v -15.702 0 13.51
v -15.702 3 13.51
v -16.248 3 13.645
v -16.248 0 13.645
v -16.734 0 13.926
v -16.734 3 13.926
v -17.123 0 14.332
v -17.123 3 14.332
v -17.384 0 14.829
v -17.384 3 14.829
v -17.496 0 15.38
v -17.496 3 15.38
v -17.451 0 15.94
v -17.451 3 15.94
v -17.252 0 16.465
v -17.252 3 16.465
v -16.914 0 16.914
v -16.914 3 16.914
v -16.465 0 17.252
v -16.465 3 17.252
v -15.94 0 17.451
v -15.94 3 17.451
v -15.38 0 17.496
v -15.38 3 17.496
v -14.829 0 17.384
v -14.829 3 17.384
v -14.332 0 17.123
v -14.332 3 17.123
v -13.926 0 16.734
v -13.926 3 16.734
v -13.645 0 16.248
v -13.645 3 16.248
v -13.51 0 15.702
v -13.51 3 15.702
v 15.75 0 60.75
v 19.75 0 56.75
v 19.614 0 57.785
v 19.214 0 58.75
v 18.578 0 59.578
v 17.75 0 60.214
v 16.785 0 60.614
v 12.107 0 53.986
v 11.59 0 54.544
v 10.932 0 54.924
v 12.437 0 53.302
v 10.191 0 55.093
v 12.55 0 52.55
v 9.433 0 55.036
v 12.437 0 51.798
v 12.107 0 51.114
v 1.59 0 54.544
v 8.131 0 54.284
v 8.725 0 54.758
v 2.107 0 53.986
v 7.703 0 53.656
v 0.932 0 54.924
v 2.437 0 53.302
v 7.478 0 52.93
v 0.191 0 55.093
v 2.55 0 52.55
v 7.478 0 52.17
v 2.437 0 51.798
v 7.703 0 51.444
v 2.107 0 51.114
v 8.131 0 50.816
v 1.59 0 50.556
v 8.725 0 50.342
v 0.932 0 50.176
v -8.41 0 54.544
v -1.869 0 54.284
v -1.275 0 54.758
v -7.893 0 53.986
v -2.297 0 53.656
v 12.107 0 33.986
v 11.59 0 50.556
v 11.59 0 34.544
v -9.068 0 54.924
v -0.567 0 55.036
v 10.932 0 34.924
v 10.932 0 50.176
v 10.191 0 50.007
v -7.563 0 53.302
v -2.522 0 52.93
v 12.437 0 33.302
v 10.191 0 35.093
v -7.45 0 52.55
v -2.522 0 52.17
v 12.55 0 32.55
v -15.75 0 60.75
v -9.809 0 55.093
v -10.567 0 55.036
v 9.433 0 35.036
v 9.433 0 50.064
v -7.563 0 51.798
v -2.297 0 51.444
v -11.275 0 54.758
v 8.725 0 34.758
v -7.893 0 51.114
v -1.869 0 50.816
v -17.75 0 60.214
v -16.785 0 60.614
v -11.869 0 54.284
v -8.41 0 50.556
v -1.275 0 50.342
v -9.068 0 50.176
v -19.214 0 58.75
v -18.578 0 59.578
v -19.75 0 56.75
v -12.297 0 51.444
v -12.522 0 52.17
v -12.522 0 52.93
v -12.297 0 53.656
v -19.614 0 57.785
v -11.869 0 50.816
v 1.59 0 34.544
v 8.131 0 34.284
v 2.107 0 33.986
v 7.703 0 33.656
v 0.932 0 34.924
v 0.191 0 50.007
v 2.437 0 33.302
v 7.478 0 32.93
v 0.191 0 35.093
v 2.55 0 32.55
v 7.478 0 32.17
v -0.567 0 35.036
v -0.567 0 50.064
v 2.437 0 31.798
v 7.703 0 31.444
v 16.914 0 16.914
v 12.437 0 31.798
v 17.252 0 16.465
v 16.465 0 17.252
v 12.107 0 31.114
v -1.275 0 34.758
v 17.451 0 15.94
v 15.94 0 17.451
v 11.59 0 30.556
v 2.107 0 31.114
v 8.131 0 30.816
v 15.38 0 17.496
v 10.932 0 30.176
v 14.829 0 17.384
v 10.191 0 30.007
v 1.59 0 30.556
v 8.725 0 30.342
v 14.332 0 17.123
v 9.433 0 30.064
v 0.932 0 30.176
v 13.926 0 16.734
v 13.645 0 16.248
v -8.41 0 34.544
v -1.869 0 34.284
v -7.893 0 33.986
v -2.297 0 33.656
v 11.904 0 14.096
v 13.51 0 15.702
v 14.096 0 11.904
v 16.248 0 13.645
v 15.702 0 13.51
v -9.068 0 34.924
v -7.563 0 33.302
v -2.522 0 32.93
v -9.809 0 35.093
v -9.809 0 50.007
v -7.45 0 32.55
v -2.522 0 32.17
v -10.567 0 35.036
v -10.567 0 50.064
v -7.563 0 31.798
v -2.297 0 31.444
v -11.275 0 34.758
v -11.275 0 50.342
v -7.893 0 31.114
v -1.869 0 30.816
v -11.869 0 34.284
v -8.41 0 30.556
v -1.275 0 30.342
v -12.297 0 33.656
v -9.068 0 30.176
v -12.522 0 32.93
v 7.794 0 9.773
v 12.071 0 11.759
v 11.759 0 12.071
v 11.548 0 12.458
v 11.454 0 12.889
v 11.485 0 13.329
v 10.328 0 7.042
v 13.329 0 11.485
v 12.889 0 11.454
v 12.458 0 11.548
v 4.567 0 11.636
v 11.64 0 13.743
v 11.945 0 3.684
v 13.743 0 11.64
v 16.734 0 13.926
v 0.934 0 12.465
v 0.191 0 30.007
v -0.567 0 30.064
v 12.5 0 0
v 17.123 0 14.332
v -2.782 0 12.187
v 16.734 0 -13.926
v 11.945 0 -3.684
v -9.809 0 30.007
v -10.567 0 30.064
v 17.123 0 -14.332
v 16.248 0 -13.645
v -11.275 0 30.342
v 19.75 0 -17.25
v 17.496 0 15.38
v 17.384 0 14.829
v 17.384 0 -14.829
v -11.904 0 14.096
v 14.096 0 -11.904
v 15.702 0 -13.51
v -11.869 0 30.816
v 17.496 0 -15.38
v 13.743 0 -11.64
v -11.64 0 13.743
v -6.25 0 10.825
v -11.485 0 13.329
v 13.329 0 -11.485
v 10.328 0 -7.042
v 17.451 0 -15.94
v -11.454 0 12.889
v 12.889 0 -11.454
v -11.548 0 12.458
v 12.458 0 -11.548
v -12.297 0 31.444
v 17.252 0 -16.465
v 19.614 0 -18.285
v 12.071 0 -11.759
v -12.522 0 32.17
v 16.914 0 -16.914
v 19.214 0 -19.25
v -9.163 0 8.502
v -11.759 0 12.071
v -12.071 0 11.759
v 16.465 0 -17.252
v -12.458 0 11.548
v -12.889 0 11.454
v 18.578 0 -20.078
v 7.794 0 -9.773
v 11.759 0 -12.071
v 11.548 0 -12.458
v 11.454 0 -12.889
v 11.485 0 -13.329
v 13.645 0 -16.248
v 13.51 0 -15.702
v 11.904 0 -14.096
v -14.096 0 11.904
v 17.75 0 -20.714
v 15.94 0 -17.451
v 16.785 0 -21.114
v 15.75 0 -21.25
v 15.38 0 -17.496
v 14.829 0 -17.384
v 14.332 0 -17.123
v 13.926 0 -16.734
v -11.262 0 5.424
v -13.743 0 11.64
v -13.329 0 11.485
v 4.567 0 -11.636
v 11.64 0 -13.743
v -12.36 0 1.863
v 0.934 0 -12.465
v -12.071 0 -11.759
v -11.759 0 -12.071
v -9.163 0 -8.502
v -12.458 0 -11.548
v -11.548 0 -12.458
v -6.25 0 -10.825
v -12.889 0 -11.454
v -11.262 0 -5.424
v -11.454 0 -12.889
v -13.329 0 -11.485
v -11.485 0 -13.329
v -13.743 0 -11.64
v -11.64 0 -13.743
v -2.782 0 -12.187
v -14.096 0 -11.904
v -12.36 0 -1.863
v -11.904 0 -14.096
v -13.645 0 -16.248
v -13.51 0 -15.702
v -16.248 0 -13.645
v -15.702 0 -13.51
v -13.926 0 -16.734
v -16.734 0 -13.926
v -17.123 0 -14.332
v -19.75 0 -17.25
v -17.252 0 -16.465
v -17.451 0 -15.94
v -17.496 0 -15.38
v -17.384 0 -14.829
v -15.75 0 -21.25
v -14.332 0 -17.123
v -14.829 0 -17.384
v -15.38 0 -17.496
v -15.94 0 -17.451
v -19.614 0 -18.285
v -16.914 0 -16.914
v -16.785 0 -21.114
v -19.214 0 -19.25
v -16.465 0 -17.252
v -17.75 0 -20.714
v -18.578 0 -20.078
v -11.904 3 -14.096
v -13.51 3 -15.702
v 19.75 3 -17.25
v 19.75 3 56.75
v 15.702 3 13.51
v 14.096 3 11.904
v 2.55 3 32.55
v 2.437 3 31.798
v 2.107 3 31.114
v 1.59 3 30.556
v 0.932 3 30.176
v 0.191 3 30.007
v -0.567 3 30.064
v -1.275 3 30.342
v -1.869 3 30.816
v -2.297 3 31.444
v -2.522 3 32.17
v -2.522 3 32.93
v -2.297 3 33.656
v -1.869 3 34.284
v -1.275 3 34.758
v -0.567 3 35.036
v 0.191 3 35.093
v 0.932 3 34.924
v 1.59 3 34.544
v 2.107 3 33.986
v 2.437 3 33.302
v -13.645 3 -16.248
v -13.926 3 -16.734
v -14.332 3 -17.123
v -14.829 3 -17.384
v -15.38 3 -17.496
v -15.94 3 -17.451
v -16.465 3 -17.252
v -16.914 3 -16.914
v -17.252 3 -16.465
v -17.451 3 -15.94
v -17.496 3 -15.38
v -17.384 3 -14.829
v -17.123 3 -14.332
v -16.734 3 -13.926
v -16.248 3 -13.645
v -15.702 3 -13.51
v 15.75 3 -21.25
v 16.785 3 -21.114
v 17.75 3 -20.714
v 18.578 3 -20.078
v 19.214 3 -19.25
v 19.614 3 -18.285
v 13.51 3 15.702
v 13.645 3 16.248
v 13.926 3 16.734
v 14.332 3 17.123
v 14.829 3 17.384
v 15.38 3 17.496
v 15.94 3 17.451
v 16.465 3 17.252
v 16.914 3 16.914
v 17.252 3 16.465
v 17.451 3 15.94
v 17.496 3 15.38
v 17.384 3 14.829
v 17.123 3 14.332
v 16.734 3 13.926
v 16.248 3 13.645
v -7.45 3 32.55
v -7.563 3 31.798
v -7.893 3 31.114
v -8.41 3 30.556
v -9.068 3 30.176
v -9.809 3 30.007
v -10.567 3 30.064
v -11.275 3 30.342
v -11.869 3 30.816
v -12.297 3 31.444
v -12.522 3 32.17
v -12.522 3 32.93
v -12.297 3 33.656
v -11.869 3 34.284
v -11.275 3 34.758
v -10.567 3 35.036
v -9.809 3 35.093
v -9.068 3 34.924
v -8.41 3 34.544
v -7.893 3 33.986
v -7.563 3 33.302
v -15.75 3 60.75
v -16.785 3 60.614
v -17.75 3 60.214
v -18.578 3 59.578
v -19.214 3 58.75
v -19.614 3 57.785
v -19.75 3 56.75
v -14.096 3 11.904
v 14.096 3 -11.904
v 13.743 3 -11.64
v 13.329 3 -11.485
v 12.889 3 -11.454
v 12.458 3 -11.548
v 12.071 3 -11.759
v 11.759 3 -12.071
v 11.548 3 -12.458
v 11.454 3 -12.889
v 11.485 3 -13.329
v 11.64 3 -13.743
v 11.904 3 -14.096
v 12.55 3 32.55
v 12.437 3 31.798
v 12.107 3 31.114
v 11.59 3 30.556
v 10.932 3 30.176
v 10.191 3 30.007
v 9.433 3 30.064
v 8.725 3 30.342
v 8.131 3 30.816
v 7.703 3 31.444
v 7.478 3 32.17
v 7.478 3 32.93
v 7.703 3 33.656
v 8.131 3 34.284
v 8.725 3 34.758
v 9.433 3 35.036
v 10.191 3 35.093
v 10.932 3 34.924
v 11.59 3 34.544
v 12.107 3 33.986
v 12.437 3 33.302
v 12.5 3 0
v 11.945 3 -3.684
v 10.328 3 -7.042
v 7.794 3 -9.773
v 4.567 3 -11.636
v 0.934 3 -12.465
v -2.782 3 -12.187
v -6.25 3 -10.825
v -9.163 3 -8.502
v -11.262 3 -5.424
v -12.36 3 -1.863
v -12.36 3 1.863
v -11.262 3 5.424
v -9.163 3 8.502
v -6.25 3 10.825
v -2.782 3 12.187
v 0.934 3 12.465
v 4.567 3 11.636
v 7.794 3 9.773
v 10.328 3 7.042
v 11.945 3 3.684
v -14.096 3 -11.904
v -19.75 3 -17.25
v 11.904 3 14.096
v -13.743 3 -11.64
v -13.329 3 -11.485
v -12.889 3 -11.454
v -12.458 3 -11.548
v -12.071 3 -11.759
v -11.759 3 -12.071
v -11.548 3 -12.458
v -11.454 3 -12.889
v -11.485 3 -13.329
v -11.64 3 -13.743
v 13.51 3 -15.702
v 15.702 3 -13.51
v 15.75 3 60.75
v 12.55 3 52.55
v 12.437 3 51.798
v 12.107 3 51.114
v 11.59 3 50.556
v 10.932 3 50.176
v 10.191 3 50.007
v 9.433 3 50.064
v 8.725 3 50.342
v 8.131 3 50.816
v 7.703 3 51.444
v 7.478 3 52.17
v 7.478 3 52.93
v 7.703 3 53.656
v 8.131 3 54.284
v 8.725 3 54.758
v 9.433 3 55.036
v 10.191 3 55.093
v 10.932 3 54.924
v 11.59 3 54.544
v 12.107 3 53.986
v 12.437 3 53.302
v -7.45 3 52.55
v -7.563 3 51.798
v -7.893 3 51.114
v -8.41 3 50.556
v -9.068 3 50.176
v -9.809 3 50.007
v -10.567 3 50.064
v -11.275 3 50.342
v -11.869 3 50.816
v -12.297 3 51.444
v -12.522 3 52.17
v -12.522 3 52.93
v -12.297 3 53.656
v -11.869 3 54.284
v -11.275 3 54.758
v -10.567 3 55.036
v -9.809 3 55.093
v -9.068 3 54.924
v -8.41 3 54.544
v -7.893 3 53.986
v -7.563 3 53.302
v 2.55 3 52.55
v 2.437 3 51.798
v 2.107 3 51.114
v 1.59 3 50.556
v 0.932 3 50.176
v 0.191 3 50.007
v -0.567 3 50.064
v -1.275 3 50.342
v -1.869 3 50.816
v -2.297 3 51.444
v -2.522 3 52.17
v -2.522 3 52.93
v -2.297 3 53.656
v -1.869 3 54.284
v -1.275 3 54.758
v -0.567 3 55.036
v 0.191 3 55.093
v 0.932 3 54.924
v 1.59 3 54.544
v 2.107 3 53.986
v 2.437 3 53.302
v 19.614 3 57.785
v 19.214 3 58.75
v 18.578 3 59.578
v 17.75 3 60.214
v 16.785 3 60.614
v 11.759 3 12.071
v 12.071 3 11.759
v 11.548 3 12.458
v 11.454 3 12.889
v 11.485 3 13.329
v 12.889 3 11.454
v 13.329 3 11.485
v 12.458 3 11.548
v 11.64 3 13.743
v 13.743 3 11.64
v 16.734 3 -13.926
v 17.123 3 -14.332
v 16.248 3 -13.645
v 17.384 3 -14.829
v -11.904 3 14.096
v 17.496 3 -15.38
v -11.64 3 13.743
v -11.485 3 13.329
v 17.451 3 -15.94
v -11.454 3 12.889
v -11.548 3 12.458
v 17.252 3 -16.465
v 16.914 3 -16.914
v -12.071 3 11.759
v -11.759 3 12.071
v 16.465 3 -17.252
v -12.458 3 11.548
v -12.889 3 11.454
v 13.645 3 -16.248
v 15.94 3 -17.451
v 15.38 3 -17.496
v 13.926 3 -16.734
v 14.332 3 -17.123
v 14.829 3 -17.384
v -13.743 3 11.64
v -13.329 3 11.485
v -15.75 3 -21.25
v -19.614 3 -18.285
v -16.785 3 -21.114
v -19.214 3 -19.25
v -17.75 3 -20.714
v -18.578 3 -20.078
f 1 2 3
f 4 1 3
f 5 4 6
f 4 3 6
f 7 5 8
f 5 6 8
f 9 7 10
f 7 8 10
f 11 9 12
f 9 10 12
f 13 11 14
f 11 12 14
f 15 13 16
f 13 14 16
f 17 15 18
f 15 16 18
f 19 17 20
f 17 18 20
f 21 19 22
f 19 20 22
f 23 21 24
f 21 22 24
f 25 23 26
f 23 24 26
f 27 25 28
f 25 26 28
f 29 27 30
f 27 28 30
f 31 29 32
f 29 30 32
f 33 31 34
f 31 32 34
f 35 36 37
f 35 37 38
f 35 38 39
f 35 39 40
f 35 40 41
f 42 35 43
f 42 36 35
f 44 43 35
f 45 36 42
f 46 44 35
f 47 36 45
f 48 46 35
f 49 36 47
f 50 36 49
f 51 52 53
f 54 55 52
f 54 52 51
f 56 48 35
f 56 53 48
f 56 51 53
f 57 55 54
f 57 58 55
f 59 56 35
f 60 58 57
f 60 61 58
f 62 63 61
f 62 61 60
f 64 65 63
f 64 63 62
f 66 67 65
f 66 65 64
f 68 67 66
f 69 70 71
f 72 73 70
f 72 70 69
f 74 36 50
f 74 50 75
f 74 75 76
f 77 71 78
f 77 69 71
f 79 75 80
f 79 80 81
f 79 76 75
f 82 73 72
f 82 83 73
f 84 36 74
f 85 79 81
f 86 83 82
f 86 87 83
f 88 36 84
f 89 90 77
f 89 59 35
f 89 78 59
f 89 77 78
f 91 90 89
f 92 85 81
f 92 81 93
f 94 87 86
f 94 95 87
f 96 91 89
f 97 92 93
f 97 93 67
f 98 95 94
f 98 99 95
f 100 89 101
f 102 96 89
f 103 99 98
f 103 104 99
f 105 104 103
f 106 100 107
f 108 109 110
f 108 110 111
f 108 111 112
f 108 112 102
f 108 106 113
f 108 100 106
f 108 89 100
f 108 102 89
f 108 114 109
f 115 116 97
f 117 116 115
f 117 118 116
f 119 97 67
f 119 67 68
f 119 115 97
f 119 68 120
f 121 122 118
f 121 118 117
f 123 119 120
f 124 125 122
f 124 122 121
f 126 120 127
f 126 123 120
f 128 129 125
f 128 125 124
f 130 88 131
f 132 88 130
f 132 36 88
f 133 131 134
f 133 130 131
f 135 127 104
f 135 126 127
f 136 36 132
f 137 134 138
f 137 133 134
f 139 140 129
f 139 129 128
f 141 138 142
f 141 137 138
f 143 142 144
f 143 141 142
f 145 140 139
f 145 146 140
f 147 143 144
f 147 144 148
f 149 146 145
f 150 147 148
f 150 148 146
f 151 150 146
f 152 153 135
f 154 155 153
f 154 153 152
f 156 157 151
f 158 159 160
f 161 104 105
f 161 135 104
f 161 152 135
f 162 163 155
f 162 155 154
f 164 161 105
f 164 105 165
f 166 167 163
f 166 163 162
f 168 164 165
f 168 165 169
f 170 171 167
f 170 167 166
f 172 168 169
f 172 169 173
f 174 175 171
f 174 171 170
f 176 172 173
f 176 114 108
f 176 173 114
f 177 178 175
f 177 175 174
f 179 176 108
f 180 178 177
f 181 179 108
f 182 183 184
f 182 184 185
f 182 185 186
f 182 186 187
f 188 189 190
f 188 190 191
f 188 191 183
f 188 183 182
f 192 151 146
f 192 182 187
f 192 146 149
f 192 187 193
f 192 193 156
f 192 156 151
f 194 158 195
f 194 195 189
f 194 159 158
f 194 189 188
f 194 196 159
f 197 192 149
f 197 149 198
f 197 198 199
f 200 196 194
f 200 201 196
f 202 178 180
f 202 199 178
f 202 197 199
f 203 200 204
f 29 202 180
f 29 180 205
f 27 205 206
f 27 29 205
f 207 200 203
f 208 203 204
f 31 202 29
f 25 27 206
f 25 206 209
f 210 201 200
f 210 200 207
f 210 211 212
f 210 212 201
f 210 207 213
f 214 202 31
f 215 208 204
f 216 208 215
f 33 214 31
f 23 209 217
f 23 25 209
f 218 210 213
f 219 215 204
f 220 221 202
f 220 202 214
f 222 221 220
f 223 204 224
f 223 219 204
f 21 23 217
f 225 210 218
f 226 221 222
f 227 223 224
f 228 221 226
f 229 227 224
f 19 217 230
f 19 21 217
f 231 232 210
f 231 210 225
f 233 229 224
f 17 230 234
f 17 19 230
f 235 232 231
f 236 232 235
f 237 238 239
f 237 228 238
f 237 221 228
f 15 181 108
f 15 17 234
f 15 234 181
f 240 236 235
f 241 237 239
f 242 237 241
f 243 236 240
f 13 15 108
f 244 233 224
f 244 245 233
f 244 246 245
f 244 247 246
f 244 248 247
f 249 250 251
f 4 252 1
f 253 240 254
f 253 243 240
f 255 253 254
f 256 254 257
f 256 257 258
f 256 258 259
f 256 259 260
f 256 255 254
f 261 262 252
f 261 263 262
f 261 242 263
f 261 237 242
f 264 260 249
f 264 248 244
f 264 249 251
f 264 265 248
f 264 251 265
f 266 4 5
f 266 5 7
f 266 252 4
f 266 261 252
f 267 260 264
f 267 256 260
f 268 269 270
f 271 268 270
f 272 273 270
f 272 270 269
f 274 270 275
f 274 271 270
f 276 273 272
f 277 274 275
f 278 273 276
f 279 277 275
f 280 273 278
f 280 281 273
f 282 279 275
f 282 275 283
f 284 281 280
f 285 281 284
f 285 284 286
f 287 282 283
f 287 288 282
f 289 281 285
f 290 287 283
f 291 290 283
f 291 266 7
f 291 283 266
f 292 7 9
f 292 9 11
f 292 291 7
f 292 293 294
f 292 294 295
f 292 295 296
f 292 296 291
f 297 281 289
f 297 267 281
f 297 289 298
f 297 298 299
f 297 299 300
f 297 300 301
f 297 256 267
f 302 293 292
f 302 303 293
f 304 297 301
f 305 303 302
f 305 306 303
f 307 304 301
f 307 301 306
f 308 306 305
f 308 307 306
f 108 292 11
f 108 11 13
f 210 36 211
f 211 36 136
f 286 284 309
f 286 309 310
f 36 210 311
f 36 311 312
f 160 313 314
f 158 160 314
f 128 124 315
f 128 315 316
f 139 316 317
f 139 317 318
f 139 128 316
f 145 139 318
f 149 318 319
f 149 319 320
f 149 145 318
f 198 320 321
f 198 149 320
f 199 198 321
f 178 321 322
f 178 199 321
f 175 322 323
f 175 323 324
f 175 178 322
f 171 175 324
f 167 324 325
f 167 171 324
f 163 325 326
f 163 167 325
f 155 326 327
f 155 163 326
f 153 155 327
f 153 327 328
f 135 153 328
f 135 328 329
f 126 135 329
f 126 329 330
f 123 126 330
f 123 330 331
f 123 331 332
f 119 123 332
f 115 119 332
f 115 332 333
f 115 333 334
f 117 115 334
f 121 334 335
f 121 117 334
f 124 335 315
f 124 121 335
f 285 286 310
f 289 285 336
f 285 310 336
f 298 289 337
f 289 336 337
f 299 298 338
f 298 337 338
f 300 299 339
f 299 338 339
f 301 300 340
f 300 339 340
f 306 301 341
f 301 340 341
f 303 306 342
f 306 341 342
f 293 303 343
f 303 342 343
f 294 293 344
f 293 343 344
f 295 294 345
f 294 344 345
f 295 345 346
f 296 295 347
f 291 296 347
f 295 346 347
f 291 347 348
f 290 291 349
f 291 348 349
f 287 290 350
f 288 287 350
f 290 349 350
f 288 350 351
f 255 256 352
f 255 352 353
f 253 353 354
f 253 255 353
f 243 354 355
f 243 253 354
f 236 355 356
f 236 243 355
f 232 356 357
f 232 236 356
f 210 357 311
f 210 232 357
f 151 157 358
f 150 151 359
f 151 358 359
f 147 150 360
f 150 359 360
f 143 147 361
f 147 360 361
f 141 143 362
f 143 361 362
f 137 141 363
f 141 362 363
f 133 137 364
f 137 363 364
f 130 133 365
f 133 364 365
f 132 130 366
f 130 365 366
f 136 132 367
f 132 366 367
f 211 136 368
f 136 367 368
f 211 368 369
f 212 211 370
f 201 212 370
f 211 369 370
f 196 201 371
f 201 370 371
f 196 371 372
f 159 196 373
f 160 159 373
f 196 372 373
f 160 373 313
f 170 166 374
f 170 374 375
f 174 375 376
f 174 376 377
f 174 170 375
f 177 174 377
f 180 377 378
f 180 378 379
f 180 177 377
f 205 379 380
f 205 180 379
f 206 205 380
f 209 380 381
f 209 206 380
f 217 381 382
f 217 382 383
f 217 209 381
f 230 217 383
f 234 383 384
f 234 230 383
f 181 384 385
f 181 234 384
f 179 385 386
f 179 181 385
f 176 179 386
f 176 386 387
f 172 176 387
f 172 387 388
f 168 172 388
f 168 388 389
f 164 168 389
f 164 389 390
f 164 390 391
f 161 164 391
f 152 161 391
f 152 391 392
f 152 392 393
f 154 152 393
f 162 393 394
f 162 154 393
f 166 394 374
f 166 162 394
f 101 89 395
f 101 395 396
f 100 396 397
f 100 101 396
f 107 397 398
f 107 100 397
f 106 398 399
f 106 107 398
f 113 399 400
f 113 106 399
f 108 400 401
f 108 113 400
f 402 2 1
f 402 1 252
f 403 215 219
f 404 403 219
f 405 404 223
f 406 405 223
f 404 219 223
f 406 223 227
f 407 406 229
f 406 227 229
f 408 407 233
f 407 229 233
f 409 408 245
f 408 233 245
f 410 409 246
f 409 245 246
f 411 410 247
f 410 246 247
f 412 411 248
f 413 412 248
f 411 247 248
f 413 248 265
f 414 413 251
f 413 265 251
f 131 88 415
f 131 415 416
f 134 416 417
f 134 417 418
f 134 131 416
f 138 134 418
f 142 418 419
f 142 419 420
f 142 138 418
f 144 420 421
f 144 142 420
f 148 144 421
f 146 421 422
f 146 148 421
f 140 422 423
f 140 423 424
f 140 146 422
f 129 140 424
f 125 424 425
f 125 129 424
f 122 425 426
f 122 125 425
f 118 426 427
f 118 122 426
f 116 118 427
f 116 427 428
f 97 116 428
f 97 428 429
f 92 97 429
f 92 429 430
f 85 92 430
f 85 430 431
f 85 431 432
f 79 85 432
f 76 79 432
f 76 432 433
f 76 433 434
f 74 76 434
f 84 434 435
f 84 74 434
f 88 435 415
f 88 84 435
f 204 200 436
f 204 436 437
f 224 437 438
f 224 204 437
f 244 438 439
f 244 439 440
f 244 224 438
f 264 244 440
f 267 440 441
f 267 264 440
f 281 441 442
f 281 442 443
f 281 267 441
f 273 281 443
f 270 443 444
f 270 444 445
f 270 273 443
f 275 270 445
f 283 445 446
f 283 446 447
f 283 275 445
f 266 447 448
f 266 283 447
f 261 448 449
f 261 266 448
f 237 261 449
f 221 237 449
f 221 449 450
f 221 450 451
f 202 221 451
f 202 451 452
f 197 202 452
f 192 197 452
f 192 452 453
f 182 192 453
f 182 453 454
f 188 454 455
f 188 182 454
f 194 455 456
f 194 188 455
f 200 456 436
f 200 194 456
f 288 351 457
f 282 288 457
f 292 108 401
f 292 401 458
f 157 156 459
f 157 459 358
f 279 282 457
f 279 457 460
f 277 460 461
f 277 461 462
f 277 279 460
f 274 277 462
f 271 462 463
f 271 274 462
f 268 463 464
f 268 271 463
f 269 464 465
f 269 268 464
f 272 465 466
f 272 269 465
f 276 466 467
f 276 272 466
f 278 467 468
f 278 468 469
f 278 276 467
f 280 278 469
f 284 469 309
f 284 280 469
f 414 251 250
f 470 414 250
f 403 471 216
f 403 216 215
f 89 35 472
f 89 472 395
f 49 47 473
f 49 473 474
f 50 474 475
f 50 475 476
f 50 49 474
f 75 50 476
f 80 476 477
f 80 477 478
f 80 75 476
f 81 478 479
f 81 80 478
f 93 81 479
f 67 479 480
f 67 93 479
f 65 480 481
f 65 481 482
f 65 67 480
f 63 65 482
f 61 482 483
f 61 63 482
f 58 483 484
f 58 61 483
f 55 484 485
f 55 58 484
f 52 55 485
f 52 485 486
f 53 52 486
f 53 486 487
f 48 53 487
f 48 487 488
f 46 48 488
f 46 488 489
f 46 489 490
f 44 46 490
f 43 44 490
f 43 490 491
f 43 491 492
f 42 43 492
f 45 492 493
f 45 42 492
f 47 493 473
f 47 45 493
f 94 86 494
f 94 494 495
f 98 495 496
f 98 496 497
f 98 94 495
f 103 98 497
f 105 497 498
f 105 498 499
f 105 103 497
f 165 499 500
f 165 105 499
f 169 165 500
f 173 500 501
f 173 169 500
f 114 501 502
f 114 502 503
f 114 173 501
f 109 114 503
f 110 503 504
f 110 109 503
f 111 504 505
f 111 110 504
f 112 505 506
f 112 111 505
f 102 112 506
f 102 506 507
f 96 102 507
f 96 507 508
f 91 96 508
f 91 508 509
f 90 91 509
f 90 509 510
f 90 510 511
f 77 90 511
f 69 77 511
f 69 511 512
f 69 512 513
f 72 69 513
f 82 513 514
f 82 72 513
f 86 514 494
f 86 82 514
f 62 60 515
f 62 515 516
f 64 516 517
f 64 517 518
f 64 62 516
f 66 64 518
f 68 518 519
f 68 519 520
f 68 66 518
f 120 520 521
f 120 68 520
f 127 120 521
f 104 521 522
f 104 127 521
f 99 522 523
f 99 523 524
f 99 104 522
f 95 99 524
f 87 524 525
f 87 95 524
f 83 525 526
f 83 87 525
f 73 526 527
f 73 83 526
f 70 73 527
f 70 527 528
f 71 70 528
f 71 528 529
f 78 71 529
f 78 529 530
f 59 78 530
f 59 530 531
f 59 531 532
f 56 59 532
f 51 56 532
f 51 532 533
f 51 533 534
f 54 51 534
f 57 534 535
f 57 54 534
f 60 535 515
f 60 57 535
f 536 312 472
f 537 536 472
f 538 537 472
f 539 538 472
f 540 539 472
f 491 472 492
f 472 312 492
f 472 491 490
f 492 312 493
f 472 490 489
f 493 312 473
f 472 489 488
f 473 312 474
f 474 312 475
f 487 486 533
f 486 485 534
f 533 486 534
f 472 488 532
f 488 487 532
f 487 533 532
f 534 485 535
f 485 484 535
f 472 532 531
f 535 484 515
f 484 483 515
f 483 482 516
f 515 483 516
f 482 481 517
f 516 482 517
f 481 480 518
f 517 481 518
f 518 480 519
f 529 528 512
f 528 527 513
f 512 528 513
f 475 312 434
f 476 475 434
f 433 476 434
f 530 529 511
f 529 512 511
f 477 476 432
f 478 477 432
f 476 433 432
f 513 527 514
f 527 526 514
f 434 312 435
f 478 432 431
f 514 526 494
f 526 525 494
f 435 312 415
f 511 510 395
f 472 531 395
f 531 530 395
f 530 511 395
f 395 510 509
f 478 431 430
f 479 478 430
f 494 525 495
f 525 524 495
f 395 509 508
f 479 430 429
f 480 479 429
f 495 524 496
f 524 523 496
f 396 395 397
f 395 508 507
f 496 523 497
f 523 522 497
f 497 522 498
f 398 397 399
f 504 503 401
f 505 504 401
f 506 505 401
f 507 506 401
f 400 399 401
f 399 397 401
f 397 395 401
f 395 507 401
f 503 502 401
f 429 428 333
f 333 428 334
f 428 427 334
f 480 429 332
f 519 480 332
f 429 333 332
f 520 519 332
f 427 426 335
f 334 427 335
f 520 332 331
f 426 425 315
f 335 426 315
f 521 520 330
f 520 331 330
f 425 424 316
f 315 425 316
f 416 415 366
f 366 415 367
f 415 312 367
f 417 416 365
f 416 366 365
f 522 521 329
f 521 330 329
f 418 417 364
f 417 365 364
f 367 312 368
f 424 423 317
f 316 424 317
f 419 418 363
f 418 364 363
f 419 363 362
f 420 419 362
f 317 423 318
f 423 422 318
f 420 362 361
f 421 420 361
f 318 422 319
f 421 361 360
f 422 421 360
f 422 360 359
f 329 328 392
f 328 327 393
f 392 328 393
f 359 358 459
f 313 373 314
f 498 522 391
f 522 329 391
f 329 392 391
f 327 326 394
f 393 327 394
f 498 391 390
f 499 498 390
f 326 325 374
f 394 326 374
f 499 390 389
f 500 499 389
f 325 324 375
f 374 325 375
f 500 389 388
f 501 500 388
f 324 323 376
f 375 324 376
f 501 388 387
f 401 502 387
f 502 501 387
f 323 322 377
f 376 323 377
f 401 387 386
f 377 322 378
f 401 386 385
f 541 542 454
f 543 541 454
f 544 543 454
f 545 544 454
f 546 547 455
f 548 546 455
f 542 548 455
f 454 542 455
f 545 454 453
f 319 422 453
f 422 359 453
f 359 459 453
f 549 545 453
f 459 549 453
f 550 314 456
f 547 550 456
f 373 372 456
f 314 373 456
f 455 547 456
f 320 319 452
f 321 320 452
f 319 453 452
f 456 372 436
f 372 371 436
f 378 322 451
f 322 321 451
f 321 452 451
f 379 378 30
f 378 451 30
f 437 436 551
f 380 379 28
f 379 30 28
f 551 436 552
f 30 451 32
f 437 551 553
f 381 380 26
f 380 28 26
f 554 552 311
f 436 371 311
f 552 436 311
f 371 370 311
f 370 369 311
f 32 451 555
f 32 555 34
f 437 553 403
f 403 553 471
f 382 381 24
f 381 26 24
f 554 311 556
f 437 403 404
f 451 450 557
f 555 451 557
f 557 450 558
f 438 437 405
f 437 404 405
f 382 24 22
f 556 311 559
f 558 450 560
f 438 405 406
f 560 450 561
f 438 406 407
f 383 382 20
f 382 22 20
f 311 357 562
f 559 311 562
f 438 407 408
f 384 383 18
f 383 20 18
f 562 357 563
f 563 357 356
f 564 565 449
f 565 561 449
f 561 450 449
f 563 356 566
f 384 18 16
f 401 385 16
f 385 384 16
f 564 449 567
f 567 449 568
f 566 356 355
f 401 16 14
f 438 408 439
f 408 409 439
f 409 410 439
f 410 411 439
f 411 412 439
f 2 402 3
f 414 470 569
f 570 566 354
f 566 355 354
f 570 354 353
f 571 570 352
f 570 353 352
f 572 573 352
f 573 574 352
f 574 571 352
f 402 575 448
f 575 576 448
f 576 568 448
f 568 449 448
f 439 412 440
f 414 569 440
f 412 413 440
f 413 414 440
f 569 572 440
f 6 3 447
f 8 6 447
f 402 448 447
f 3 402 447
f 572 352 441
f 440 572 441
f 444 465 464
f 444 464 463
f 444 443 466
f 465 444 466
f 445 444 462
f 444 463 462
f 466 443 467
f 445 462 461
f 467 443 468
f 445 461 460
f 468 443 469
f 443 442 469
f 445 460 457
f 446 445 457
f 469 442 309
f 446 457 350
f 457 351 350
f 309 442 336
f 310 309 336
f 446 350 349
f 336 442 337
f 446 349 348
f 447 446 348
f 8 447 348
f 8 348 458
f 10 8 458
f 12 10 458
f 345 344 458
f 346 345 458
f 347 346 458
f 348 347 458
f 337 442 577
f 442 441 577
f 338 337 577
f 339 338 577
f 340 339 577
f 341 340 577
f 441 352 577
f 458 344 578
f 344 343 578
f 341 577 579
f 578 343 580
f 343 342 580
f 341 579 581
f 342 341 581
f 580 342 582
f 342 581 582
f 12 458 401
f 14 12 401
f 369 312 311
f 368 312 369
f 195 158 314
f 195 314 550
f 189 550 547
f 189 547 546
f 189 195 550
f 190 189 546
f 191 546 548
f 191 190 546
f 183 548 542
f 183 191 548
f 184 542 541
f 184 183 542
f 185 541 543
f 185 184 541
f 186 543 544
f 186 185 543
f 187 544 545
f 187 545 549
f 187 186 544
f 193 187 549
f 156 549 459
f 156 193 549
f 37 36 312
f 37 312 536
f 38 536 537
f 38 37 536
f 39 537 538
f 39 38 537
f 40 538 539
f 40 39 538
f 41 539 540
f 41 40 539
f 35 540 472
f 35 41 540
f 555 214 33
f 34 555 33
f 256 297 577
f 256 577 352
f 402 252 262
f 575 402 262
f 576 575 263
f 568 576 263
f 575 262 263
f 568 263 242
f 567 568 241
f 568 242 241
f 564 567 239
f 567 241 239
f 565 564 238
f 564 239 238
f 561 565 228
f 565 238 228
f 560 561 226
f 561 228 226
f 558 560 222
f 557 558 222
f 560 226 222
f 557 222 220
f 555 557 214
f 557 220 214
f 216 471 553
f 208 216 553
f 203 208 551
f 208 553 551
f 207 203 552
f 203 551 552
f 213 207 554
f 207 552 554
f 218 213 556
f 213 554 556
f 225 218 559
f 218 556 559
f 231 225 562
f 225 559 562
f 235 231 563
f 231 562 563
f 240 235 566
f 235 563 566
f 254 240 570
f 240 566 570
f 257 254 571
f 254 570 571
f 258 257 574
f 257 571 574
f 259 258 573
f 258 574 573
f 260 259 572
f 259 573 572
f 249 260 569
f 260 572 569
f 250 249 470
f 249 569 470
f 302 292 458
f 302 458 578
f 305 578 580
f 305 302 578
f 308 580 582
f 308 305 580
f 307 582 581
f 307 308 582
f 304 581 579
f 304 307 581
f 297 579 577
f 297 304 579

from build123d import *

# Parameters (mm, degrees)
SKETCH1_R           = 12.5
SKETCH1_R_2         = 2.55
BOSS_EXTRUDE1_DEPTH = 3
SKETCH2_R           = 2
CUT_EXTRUDE1_DEPTH  = 10


with BuildPart() as part:
    # Sketch1 → Boss-Extrude1 (new body)
    with BuildSketch(Plane(origin=(0, 0, 0), x_dir=(1, 0, 0), z_dir=(0, 1, 0))):
        with BuildLine():
            Line((15.75, -60.75), (-15.75, -60.75))
            ThreePointArc((-15.75, -60.75), (-18.578427125, -59.578427125), (-19.75, -56.75))
            Line((-19.75, -56.75), (-19.75, 17.25))
            ThreePointArc((-19.75, 17.25), (-18.578427125, 20.078427125), (-15.75, 21.25))
            Line((-15.75, 21.25), (15.75, 21.25))
            ThreePointArc((15.75, 21.25), (18.578427125, 20.078427125), (19.75, 17.25))
            Line((19.75, 17.25), (19.75, -56.75))
            ThreePointArc((19.75, -56.75), (18.578427125, -59.578427125), (15.75, -60.75))
        make_face()
        Circle(SKETCH1_R, mode=Mode.SUBTRACT)
        with Locations((10, -52.55)):
            Circle(SKETCH1_R_2, mode=Mode.SUBTRACT)
        with Locations((10, -32.55)):
            Circle(SKETCH1_R_2, mode=Mode.SUBTRACT)
        with Locations((0, -52.55)):
            Circle(SKETCH1_R_2, mode=Mode.SUBTRACT)
        with Locations((0, -32.55)):
            Circle(SKETCH1_R_2, mode=Mode.SUBTRACT)
        with Locations((-10, -52.55)):
            Circle(SKETCH1_R_2, mode=Mode.SUBTRACT)
        with Locations((-10, -32.55)):
            Circle(SKETCH1_R_2, mode=Mode.SUBTRACT)
        with BuildLine():
            Line((11.903984489, 14.096015511), (14.403984489, 16.596015511))
            ThreePointArc((14.403984489, 16.596015511), (16.596015511, 16.596015511), (16.596015511, 14.403984489))
            Line((16.596015511, 14.403984489), (14.096015511, 11.903984489))
            ThreePointArc((14.096015511, 11.903984489), (11.903984489, 11.903984489), (11.903984489, 14.096015511))
        make_face(mode=Mode.SUBTRACT)
        with BuildLine():
            Line((-11.903984489, 14.096015511), (-14.403984489, 16.596015511))
            ThreePointArc((-14.403984489, 16.596015511), (-16.596015511, 16.596015511), (-16.596015511, 14.403984489))
            Line((-16.596015511, 14.403984489), (-14.096015511, 11.903984489))
            ThreePointArc((-14.096015511, 11.903984489), (-11.903984489, 11.903984489), (-11.903984489, 14.096015511))
        make_face(mode=Mode.SUBTRACT)
        with BuildLine():
            Line((-11.903984489, -14.096015511), (-14.403984489, -16.596015511))
            ThreePointArc((-14.403984489, -16.596015511), (-16.596015511, -16.596015511), (-16.596015511, -14.403984489))
            Line((-16.596015511, -14.403984489), (-14.096015511, -11.903984489))
            ThreePointArc((-14.096015511, -11.903984489), (-11.903984489, -11.903984489), (-11.903984489, -14.096015511))
        make_face(mode=Mode.SUBTRACT)
        with BuildLine():
            Line((11.903984489, -14.096015511), (14.403984489, -16.596015511))
            ThreePointArc((14.403984489, -16.596015511), (16.596015511, -16.596015511), (16.596015511, -14.403984489))
            Line((16.596015511, -14.403984489), (14.096015511, -11.903984489))
            ThreePointArc((14.096015511, -11.903984489), (11.903984489, -11.903984489), (11.903984489, -14.096015511))
        make_face(mode=Mode.SUBTRACT)
    extrude(amount=BOSS_EXTRUDE1_DEPTH)

    # Sketch2 → Cut-Extrude1 (cut)
    with BuildSketch(Plane(origin=(0, 3, 0), x_dir=(1, 0, 0), z_dir=(0, 1, 0))):
        with Locations((-15.5, 15.5)):
            Circle(SKETCH2_R)
        with Locations((15.5, 15.5)):
            Circle(SKETCH2_R)
        with Locations((-15.5, -15.5)):
            Circle(SKETCH2_R)
        with Locations((15.5, -15.5)):
            Circle(SKETCH2_R)
    extrude(amount=-CUT_EXTRUDE1_DEPTH, mode=Mode.SUBTRACT)


solid = part.part
